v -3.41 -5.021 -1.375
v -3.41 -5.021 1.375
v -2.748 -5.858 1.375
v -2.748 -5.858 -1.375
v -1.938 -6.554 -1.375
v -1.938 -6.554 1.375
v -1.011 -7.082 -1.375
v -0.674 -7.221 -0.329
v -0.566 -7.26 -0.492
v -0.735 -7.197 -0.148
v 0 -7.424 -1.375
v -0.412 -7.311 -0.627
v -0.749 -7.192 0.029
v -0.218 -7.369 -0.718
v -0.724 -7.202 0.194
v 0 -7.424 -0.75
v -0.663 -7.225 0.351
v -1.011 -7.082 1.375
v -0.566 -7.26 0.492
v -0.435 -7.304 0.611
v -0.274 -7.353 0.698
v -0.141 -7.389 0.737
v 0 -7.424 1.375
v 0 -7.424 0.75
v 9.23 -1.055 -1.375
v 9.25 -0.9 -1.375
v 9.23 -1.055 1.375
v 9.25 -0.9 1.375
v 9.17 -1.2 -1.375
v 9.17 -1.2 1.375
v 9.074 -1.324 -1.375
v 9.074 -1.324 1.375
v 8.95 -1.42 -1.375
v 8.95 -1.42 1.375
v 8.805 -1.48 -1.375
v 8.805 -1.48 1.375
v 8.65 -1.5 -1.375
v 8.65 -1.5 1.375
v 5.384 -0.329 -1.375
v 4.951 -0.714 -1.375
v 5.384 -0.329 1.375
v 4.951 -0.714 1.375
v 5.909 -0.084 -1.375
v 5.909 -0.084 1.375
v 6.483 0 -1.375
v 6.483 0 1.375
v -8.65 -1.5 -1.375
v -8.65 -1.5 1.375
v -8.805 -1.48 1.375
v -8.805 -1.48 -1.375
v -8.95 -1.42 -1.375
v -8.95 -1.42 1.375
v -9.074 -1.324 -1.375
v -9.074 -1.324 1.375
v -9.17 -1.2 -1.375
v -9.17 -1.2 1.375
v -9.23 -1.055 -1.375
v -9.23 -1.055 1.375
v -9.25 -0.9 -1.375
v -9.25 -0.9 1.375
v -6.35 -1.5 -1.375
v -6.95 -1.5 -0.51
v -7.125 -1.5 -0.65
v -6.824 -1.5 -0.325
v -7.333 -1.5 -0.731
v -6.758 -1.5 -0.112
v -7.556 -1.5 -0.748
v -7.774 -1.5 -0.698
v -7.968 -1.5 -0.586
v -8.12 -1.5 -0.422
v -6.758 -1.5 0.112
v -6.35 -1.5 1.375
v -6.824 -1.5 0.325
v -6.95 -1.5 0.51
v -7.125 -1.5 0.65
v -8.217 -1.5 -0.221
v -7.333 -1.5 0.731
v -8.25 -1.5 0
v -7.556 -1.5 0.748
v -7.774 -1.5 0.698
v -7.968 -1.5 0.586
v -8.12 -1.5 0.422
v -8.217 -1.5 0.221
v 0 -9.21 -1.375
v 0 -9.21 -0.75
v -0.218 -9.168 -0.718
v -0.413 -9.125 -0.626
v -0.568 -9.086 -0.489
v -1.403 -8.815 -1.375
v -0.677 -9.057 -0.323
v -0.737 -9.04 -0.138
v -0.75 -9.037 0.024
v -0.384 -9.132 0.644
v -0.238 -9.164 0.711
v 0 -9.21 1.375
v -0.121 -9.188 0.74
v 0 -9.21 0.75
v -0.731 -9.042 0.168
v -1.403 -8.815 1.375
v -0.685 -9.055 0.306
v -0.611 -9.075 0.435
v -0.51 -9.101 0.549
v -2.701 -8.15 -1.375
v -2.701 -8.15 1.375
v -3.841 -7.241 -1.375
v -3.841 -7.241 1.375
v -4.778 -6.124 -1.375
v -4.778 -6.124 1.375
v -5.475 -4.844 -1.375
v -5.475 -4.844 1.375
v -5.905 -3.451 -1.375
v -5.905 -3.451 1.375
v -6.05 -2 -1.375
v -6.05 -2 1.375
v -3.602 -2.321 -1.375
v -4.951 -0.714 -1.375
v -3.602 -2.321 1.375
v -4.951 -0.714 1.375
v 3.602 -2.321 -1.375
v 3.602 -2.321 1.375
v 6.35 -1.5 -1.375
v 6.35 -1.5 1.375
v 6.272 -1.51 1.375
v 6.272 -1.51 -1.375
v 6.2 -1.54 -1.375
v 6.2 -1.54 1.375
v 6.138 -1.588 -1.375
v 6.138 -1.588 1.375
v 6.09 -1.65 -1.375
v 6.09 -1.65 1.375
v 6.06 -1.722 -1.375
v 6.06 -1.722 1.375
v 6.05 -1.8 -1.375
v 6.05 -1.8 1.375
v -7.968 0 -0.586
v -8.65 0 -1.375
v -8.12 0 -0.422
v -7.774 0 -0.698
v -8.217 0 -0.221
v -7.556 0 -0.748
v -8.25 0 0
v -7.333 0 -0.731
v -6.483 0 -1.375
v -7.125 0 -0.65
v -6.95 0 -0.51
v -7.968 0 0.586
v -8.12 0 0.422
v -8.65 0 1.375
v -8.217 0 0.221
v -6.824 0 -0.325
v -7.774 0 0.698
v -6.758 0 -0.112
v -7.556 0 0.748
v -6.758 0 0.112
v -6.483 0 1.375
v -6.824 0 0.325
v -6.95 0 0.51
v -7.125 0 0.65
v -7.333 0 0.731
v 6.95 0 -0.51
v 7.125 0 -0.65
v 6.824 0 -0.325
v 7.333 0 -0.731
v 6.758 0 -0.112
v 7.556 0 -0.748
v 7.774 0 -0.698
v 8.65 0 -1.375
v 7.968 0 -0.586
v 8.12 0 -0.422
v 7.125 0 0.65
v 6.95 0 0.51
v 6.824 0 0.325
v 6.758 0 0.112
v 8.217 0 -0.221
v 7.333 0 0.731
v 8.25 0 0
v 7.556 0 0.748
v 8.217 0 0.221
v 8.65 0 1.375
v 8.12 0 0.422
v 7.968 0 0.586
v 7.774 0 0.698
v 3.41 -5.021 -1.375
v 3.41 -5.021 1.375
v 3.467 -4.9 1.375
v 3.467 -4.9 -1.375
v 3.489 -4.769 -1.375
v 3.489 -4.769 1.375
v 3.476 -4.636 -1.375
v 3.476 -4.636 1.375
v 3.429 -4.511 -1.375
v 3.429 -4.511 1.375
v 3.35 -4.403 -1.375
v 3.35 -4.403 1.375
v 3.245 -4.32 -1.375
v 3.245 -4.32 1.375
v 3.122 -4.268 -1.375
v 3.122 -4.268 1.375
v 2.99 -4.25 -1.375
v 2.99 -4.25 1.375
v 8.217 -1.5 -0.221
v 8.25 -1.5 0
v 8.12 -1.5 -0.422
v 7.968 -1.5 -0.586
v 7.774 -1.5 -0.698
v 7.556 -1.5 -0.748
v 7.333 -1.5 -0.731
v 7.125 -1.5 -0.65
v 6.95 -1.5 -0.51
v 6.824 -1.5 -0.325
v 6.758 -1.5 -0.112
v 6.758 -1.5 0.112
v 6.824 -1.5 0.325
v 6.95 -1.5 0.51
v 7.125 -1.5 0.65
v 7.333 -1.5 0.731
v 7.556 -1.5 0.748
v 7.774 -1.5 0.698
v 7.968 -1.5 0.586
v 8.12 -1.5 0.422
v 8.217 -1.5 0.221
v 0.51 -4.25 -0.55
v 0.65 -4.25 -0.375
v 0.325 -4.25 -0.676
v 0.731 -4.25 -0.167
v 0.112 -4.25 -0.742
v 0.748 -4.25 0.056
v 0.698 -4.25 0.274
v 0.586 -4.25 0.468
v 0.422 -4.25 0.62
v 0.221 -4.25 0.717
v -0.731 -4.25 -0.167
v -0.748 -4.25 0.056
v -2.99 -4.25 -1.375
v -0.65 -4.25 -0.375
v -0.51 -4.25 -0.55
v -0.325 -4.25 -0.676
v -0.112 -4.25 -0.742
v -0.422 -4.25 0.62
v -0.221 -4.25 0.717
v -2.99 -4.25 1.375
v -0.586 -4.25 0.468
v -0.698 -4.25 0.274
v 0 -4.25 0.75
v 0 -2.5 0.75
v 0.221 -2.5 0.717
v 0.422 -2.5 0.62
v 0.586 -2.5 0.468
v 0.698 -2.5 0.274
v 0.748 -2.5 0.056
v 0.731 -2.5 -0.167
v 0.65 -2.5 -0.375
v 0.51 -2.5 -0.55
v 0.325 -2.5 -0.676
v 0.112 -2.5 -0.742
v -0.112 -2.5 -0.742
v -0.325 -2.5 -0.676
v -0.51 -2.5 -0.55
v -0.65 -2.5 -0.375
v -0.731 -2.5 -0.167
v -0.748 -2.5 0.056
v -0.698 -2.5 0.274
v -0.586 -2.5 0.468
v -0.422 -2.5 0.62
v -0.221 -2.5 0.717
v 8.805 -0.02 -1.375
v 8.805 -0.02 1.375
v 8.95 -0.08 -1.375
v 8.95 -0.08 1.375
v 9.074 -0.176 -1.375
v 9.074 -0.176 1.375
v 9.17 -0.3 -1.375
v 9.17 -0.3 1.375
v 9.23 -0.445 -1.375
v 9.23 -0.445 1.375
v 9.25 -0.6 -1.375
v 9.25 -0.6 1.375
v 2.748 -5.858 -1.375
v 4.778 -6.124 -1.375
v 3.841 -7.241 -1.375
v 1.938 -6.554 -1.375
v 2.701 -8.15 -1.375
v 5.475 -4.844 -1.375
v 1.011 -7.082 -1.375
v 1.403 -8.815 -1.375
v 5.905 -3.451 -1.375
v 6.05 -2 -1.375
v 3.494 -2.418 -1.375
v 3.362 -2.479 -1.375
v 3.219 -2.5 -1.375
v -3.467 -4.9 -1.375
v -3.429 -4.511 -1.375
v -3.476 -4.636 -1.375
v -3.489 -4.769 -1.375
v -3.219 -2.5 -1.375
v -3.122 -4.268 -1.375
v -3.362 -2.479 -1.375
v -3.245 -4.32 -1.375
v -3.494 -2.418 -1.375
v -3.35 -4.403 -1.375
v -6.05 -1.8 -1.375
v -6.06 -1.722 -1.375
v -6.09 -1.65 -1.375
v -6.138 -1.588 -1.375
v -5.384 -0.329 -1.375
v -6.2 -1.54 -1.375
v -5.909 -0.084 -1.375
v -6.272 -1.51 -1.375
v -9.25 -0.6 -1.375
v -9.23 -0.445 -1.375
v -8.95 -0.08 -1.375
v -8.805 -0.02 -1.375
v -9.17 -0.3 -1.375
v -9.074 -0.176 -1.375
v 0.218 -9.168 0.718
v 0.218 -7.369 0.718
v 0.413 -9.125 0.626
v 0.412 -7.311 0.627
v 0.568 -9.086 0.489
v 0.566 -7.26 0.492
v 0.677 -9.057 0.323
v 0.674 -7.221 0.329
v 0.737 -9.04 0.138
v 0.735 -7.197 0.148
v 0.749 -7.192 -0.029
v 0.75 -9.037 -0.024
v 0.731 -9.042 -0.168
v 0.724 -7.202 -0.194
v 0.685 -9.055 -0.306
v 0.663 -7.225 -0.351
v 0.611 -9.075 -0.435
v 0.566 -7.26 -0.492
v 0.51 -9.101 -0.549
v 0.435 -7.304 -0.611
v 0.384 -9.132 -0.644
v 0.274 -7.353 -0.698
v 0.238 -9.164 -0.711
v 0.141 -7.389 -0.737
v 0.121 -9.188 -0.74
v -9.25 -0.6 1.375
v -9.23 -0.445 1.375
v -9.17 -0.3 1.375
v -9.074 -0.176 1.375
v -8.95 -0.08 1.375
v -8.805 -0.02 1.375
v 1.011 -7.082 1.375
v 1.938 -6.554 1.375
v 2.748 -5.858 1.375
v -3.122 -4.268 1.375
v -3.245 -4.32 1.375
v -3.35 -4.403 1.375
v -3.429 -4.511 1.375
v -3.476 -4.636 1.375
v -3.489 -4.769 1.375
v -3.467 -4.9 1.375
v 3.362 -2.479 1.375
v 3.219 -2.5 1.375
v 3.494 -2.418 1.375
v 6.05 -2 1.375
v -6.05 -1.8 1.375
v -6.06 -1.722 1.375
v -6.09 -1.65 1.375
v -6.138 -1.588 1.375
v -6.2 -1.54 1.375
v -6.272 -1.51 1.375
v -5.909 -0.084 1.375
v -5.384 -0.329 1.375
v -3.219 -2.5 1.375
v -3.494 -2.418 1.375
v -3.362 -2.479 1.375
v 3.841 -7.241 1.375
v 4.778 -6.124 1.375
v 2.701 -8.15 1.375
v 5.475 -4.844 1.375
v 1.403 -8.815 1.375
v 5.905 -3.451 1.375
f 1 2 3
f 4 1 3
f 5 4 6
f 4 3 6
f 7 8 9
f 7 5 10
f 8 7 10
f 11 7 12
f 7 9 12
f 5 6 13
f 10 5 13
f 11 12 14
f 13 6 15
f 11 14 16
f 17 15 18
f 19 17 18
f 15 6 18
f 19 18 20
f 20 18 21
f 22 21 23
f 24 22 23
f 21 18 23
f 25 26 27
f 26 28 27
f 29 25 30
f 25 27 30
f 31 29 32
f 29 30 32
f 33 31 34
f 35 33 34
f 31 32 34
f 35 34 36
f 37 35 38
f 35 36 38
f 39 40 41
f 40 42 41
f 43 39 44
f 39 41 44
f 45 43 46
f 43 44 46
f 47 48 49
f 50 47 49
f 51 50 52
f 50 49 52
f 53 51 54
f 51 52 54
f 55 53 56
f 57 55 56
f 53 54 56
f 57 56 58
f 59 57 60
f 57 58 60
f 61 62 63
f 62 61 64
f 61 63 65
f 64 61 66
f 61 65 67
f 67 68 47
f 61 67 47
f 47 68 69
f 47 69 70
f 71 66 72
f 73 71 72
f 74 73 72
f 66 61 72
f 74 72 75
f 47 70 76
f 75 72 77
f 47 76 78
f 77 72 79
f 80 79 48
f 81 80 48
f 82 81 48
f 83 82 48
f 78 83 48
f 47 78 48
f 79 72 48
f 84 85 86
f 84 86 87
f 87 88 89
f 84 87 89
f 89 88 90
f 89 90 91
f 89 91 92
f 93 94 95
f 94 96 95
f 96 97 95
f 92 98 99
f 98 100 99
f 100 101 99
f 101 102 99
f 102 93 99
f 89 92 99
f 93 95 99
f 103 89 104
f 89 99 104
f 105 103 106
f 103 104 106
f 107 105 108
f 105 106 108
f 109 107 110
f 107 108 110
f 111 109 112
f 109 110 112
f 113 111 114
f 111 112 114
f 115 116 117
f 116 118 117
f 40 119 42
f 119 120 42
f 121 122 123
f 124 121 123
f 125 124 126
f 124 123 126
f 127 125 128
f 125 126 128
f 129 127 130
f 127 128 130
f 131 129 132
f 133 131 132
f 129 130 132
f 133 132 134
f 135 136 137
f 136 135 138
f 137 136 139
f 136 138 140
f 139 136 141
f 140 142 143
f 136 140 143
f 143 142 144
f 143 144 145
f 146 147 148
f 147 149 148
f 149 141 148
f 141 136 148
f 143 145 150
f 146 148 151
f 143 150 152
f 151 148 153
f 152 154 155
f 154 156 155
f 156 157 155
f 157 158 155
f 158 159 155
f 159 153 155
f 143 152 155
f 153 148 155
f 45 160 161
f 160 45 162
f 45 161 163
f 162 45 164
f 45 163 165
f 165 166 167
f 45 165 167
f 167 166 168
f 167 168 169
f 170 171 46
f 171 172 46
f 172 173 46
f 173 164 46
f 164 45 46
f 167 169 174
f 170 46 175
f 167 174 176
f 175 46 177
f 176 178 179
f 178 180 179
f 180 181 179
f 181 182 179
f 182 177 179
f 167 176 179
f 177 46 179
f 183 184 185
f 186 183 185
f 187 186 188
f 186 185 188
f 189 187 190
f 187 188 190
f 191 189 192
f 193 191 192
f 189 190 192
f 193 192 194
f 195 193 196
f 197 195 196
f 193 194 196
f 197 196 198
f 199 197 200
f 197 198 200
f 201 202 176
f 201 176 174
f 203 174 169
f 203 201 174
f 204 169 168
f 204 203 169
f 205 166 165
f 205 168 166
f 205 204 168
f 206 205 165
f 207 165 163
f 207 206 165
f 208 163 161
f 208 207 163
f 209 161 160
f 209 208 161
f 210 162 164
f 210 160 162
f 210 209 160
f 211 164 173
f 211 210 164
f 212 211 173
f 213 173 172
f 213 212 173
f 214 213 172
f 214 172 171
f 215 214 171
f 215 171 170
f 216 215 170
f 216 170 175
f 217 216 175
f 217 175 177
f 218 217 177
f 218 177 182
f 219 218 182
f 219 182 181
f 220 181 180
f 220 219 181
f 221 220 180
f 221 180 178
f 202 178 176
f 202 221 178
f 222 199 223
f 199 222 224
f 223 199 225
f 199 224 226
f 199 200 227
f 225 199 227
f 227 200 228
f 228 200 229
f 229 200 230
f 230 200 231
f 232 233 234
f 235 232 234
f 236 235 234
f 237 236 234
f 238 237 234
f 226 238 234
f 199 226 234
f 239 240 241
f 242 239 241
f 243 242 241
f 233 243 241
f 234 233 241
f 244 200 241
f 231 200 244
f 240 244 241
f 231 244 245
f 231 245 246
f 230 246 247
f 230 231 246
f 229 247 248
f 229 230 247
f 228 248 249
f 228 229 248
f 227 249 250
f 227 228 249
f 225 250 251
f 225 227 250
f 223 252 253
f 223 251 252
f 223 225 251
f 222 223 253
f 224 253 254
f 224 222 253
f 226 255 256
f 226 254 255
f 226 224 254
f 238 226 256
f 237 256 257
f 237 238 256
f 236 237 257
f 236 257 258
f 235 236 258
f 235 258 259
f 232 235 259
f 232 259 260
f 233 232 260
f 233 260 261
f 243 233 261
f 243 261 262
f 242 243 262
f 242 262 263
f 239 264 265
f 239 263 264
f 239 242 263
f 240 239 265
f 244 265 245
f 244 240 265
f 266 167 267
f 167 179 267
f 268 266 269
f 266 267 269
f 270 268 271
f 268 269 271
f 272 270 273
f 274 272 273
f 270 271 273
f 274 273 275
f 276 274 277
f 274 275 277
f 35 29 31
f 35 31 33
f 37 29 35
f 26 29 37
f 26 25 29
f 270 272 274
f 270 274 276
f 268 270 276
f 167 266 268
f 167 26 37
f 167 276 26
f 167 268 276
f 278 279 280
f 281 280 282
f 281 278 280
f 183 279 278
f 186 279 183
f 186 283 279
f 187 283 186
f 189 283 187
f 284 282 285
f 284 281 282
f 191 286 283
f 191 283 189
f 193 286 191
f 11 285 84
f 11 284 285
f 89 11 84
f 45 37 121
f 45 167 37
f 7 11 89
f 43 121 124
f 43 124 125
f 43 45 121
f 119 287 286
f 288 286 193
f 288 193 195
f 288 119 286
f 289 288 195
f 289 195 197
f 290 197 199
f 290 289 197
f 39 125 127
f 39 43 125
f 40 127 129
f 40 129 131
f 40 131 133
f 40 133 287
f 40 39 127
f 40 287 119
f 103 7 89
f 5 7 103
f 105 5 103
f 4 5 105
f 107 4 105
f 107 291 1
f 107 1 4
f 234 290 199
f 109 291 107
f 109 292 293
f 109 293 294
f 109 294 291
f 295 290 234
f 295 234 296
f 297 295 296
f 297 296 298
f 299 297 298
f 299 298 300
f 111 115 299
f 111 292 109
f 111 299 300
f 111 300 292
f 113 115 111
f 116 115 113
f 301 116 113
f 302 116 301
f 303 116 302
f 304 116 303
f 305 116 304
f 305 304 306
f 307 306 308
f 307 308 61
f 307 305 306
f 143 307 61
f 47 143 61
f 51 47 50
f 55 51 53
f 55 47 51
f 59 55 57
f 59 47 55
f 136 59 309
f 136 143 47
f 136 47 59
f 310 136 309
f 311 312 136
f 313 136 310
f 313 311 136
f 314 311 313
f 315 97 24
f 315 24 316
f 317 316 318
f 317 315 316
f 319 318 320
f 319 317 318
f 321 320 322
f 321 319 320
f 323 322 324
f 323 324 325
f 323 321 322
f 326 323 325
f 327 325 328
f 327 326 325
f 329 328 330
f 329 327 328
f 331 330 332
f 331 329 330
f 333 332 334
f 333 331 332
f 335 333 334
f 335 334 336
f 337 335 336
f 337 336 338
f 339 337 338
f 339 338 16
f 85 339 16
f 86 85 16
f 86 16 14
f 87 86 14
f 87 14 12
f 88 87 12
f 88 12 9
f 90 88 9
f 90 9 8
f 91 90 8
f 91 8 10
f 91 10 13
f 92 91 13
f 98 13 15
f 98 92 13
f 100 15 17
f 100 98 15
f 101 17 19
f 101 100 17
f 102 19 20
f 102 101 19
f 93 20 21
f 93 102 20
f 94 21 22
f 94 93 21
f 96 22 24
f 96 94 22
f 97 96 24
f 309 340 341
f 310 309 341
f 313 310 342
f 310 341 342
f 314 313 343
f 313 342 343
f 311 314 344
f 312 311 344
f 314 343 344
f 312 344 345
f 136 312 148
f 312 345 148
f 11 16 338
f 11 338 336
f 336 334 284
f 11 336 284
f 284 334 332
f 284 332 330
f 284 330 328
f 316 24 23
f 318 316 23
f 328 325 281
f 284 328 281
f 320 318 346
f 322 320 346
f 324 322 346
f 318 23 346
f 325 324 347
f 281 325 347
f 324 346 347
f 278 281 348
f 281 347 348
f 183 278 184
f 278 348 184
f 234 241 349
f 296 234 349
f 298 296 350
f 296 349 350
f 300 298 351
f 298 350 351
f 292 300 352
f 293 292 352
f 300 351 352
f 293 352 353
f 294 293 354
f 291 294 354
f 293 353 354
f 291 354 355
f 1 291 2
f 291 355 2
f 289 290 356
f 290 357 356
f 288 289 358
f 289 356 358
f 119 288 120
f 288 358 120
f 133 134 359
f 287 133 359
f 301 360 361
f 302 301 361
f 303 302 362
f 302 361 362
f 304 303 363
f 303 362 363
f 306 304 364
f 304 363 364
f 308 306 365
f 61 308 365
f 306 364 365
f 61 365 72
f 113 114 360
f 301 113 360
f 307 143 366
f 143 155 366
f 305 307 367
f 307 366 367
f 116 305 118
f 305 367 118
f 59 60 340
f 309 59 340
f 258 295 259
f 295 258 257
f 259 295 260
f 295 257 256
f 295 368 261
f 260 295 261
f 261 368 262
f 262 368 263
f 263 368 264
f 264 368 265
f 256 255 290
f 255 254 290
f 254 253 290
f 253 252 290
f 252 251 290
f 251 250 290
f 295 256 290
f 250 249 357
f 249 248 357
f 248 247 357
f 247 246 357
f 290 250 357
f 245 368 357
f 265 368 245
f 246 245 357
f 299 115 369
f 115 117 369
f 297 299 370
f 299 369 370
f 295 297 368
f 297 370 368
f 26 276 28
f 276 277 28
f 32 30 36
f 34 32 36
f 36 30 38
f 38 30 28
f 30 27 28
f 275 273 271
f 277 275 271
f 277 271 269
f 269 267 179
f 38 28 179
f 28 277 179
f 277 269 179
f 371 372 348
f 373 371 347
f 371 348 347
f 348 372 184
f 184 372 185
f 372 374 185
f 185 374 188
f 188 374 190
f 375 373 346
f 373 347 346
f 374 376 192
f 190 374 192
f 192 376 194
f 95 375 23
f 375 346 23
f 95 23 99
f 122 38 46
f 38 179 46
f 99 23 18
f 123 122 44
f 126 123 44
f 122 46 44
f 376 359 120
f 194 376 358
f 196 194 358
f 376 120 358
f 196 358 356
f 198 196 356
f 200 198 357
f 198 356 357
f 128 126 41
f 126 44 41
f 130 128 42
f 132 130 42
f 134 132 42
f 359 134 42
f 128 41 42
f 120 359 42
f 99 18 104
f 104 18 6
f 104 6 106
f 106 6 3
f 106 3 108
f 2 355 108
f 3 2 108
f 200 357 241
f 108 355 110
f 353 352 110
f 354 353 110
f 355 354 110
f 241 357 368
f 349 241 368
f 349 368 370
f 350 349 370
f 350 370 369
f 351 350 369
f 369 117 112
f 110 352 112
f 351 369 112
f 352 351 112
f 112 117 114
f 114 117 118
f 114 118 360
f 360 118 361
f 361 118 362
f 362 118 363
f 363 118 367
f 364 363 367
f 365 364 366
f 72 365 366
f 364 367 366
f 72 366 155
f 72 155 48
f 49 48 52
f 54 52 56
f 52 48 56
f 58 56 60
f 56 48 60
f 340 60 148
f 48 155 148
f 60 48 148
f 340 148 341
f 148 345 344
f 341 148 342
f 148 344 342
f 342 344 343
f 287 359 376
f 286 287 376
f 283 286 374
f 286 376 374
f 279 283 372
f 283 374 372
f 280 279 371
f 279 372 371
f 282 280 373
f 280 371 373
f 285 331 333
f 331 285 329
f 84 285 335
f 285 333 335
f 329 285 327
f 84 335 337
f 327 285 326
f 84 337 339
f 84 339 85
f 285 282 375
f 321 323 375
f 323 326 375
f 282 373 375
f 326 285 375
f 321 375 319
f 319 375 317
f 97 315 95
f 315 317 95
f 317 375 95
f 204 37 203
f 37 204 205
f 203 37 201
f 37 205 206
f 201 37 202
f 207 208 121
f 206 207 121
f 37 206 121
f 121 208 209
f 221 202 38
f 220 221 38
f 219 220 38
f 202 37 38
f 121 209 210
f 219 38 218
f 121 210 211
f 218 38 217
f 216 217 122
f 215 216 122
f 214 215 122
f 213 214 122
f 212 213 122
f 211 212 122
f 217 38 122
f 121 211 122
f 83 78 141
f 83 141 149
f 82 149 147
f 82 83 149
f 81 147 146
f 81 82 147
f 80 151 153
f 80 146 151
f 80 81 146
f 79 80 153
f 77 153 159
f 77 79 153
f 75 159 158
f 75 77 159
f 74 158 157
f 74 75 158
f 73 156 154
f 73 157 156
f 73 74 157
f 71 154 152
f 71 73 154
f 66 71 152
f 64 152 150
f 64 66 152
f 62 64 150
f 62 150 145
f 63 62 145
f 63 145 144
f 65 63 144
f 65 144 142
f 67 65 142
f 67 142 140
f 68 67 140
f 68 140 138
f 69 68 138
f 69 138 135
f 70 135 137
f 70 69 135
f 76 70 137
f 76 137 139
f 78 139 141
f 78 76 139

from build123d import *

# Parameters (mm, degrees)
BOSS_EXTRUDE1_DEPTH     = 1.375
CUT_EXTRUDE1_DEPTH      = 14.125518547
CUT_EXTRUDE1_DEPTH_BACK = 14.125518547
SKETCH2_R               = 0.75


with BuildPart() as part:
    # Sketch1 → Boss-Extrude1 (new, symmetric)
    with BuildSketch(Plane.XY):
        with BuildLine():
            Line((-8.65, 0), (-6.482615316, 0))
            ThreePointArc((-6.482615316, 0), (-5.637378793, -0.187384426), (-4.95052643, -0.714424781))
            Line((-4.95052643, -0.714424781), (-3.602119315, -2.321393805))
            ThreePointArc((-3.602119315, -2.321393805), (-3.430406224, -2.453153894), (-3.219097093, -2.5))
            Line((-3.219097093, -2.5), (3.219097093, -2.5))
            ThreePointArc((3.219097093, -2.5), (3.430406224, -2.453153894), (3.602119315, -2.321393805))
            Line((3.602119315, -2.321393805), (4.95052643, -0.714424781))
            ThreePointArc((4.95052643, -0.714424781), (5.637378793, -0.187384426), (6.482615316, 0))
            Line((6.482615316, 0), (8.65, 0))
            ThreePointArc((8.65, 0), (9.074264069, -0.175735931), (9.25, -0.6))
            Line((9.25, -0.6), (9.25, -0.9))
            ThreePointArc((9.25, -0.9), (9.074264069, -1.324264069), (8.65, -1.5))
            Line((8.65, -1.5), (6.35, -1.5))
            ThreePointArc((6.35, -1.5), (6.137867966, -1.587867966), (6.05, -1.8))
            Line((6.05, -1.8), (6.05, -2))
            ThreePointArc((6.05, -2), (4.337132574, -6.706064576), (0, -9.210109235))
            ThreePointArc((0, -9.210109235), (-4.337132574, -6.706064576), (-6.05, -2))
            Line((-6.05, -2), (-6.05, -1.8))
            ThreePointArc((-6.05, -1.8), (-6.137867966, -1.587867966), (-6.35, -1.5))
            Line((-6.35, -1.5), (-8.65, -1.5))
            ThreePointArc((-8.65, -1.5), (-9.074264069, -1.324264069), (-9.25, -0.9))
            Line((-9.25, -0.9), (-9.25, -0.6))
            ThreePointArc((-9.25, -0.6), (-9.074264069, -0.175735931), (-8.65, 0))
        make_face()
        with BuildLine():
            Line((2.989643947, -4.25), (-2.989643947, -4.25))
            ThreePointArc((-2.989643947, -4.25), (-3.428714462, -4.510799074), (-3.409748242, -5.021131667))
            ThreePointArc((-3.409748242, -5.021131667), (-1.938287409, -6.553911081), (0, -7.424342947))
            ThreePointArc((0, -7.424342947), (1.938287409, -6.553911081), (3.409748242, -5.021131667))
            ThreePointArc((3.409748242, -5.021131667), (3.428714462, -4.510799074), (2.989643947, -4.25))
        make_face(mode=Mode.SUBTRACT)
    extrude(amount=BOSS_EXTRUDE1_DEPTH, both=True)

    # Sketch2 → Cut-Extrude1 (cut, two sides: drawn at the far end of the back side and taken through both)
    with BuildSketch(Plane(origin=(0, 0, 0), x_dir=(1, 0, 0), z_dir=(0, 1, 0)).offset(-CUT_EXTRUDE1_DEPTH_BACK)):
        with Locations(Location((0, 0, 0), (0, 0, 270))):
            Circle(SKETCH2_R)
        with Locations(Location((-7.5, 0, 0), (0, 0, 180))):
            Circle(SKETCH2_R)
        with Locations((7.5, 0)):
            Circle(SKETCH2_R)
    extrude(amount=CUT_EXTRUDE1_DEPTH + CUT_EXTRUDE1_DEPTH_BACK, mode=Mode.SUBTRACT)


solid = part.part
